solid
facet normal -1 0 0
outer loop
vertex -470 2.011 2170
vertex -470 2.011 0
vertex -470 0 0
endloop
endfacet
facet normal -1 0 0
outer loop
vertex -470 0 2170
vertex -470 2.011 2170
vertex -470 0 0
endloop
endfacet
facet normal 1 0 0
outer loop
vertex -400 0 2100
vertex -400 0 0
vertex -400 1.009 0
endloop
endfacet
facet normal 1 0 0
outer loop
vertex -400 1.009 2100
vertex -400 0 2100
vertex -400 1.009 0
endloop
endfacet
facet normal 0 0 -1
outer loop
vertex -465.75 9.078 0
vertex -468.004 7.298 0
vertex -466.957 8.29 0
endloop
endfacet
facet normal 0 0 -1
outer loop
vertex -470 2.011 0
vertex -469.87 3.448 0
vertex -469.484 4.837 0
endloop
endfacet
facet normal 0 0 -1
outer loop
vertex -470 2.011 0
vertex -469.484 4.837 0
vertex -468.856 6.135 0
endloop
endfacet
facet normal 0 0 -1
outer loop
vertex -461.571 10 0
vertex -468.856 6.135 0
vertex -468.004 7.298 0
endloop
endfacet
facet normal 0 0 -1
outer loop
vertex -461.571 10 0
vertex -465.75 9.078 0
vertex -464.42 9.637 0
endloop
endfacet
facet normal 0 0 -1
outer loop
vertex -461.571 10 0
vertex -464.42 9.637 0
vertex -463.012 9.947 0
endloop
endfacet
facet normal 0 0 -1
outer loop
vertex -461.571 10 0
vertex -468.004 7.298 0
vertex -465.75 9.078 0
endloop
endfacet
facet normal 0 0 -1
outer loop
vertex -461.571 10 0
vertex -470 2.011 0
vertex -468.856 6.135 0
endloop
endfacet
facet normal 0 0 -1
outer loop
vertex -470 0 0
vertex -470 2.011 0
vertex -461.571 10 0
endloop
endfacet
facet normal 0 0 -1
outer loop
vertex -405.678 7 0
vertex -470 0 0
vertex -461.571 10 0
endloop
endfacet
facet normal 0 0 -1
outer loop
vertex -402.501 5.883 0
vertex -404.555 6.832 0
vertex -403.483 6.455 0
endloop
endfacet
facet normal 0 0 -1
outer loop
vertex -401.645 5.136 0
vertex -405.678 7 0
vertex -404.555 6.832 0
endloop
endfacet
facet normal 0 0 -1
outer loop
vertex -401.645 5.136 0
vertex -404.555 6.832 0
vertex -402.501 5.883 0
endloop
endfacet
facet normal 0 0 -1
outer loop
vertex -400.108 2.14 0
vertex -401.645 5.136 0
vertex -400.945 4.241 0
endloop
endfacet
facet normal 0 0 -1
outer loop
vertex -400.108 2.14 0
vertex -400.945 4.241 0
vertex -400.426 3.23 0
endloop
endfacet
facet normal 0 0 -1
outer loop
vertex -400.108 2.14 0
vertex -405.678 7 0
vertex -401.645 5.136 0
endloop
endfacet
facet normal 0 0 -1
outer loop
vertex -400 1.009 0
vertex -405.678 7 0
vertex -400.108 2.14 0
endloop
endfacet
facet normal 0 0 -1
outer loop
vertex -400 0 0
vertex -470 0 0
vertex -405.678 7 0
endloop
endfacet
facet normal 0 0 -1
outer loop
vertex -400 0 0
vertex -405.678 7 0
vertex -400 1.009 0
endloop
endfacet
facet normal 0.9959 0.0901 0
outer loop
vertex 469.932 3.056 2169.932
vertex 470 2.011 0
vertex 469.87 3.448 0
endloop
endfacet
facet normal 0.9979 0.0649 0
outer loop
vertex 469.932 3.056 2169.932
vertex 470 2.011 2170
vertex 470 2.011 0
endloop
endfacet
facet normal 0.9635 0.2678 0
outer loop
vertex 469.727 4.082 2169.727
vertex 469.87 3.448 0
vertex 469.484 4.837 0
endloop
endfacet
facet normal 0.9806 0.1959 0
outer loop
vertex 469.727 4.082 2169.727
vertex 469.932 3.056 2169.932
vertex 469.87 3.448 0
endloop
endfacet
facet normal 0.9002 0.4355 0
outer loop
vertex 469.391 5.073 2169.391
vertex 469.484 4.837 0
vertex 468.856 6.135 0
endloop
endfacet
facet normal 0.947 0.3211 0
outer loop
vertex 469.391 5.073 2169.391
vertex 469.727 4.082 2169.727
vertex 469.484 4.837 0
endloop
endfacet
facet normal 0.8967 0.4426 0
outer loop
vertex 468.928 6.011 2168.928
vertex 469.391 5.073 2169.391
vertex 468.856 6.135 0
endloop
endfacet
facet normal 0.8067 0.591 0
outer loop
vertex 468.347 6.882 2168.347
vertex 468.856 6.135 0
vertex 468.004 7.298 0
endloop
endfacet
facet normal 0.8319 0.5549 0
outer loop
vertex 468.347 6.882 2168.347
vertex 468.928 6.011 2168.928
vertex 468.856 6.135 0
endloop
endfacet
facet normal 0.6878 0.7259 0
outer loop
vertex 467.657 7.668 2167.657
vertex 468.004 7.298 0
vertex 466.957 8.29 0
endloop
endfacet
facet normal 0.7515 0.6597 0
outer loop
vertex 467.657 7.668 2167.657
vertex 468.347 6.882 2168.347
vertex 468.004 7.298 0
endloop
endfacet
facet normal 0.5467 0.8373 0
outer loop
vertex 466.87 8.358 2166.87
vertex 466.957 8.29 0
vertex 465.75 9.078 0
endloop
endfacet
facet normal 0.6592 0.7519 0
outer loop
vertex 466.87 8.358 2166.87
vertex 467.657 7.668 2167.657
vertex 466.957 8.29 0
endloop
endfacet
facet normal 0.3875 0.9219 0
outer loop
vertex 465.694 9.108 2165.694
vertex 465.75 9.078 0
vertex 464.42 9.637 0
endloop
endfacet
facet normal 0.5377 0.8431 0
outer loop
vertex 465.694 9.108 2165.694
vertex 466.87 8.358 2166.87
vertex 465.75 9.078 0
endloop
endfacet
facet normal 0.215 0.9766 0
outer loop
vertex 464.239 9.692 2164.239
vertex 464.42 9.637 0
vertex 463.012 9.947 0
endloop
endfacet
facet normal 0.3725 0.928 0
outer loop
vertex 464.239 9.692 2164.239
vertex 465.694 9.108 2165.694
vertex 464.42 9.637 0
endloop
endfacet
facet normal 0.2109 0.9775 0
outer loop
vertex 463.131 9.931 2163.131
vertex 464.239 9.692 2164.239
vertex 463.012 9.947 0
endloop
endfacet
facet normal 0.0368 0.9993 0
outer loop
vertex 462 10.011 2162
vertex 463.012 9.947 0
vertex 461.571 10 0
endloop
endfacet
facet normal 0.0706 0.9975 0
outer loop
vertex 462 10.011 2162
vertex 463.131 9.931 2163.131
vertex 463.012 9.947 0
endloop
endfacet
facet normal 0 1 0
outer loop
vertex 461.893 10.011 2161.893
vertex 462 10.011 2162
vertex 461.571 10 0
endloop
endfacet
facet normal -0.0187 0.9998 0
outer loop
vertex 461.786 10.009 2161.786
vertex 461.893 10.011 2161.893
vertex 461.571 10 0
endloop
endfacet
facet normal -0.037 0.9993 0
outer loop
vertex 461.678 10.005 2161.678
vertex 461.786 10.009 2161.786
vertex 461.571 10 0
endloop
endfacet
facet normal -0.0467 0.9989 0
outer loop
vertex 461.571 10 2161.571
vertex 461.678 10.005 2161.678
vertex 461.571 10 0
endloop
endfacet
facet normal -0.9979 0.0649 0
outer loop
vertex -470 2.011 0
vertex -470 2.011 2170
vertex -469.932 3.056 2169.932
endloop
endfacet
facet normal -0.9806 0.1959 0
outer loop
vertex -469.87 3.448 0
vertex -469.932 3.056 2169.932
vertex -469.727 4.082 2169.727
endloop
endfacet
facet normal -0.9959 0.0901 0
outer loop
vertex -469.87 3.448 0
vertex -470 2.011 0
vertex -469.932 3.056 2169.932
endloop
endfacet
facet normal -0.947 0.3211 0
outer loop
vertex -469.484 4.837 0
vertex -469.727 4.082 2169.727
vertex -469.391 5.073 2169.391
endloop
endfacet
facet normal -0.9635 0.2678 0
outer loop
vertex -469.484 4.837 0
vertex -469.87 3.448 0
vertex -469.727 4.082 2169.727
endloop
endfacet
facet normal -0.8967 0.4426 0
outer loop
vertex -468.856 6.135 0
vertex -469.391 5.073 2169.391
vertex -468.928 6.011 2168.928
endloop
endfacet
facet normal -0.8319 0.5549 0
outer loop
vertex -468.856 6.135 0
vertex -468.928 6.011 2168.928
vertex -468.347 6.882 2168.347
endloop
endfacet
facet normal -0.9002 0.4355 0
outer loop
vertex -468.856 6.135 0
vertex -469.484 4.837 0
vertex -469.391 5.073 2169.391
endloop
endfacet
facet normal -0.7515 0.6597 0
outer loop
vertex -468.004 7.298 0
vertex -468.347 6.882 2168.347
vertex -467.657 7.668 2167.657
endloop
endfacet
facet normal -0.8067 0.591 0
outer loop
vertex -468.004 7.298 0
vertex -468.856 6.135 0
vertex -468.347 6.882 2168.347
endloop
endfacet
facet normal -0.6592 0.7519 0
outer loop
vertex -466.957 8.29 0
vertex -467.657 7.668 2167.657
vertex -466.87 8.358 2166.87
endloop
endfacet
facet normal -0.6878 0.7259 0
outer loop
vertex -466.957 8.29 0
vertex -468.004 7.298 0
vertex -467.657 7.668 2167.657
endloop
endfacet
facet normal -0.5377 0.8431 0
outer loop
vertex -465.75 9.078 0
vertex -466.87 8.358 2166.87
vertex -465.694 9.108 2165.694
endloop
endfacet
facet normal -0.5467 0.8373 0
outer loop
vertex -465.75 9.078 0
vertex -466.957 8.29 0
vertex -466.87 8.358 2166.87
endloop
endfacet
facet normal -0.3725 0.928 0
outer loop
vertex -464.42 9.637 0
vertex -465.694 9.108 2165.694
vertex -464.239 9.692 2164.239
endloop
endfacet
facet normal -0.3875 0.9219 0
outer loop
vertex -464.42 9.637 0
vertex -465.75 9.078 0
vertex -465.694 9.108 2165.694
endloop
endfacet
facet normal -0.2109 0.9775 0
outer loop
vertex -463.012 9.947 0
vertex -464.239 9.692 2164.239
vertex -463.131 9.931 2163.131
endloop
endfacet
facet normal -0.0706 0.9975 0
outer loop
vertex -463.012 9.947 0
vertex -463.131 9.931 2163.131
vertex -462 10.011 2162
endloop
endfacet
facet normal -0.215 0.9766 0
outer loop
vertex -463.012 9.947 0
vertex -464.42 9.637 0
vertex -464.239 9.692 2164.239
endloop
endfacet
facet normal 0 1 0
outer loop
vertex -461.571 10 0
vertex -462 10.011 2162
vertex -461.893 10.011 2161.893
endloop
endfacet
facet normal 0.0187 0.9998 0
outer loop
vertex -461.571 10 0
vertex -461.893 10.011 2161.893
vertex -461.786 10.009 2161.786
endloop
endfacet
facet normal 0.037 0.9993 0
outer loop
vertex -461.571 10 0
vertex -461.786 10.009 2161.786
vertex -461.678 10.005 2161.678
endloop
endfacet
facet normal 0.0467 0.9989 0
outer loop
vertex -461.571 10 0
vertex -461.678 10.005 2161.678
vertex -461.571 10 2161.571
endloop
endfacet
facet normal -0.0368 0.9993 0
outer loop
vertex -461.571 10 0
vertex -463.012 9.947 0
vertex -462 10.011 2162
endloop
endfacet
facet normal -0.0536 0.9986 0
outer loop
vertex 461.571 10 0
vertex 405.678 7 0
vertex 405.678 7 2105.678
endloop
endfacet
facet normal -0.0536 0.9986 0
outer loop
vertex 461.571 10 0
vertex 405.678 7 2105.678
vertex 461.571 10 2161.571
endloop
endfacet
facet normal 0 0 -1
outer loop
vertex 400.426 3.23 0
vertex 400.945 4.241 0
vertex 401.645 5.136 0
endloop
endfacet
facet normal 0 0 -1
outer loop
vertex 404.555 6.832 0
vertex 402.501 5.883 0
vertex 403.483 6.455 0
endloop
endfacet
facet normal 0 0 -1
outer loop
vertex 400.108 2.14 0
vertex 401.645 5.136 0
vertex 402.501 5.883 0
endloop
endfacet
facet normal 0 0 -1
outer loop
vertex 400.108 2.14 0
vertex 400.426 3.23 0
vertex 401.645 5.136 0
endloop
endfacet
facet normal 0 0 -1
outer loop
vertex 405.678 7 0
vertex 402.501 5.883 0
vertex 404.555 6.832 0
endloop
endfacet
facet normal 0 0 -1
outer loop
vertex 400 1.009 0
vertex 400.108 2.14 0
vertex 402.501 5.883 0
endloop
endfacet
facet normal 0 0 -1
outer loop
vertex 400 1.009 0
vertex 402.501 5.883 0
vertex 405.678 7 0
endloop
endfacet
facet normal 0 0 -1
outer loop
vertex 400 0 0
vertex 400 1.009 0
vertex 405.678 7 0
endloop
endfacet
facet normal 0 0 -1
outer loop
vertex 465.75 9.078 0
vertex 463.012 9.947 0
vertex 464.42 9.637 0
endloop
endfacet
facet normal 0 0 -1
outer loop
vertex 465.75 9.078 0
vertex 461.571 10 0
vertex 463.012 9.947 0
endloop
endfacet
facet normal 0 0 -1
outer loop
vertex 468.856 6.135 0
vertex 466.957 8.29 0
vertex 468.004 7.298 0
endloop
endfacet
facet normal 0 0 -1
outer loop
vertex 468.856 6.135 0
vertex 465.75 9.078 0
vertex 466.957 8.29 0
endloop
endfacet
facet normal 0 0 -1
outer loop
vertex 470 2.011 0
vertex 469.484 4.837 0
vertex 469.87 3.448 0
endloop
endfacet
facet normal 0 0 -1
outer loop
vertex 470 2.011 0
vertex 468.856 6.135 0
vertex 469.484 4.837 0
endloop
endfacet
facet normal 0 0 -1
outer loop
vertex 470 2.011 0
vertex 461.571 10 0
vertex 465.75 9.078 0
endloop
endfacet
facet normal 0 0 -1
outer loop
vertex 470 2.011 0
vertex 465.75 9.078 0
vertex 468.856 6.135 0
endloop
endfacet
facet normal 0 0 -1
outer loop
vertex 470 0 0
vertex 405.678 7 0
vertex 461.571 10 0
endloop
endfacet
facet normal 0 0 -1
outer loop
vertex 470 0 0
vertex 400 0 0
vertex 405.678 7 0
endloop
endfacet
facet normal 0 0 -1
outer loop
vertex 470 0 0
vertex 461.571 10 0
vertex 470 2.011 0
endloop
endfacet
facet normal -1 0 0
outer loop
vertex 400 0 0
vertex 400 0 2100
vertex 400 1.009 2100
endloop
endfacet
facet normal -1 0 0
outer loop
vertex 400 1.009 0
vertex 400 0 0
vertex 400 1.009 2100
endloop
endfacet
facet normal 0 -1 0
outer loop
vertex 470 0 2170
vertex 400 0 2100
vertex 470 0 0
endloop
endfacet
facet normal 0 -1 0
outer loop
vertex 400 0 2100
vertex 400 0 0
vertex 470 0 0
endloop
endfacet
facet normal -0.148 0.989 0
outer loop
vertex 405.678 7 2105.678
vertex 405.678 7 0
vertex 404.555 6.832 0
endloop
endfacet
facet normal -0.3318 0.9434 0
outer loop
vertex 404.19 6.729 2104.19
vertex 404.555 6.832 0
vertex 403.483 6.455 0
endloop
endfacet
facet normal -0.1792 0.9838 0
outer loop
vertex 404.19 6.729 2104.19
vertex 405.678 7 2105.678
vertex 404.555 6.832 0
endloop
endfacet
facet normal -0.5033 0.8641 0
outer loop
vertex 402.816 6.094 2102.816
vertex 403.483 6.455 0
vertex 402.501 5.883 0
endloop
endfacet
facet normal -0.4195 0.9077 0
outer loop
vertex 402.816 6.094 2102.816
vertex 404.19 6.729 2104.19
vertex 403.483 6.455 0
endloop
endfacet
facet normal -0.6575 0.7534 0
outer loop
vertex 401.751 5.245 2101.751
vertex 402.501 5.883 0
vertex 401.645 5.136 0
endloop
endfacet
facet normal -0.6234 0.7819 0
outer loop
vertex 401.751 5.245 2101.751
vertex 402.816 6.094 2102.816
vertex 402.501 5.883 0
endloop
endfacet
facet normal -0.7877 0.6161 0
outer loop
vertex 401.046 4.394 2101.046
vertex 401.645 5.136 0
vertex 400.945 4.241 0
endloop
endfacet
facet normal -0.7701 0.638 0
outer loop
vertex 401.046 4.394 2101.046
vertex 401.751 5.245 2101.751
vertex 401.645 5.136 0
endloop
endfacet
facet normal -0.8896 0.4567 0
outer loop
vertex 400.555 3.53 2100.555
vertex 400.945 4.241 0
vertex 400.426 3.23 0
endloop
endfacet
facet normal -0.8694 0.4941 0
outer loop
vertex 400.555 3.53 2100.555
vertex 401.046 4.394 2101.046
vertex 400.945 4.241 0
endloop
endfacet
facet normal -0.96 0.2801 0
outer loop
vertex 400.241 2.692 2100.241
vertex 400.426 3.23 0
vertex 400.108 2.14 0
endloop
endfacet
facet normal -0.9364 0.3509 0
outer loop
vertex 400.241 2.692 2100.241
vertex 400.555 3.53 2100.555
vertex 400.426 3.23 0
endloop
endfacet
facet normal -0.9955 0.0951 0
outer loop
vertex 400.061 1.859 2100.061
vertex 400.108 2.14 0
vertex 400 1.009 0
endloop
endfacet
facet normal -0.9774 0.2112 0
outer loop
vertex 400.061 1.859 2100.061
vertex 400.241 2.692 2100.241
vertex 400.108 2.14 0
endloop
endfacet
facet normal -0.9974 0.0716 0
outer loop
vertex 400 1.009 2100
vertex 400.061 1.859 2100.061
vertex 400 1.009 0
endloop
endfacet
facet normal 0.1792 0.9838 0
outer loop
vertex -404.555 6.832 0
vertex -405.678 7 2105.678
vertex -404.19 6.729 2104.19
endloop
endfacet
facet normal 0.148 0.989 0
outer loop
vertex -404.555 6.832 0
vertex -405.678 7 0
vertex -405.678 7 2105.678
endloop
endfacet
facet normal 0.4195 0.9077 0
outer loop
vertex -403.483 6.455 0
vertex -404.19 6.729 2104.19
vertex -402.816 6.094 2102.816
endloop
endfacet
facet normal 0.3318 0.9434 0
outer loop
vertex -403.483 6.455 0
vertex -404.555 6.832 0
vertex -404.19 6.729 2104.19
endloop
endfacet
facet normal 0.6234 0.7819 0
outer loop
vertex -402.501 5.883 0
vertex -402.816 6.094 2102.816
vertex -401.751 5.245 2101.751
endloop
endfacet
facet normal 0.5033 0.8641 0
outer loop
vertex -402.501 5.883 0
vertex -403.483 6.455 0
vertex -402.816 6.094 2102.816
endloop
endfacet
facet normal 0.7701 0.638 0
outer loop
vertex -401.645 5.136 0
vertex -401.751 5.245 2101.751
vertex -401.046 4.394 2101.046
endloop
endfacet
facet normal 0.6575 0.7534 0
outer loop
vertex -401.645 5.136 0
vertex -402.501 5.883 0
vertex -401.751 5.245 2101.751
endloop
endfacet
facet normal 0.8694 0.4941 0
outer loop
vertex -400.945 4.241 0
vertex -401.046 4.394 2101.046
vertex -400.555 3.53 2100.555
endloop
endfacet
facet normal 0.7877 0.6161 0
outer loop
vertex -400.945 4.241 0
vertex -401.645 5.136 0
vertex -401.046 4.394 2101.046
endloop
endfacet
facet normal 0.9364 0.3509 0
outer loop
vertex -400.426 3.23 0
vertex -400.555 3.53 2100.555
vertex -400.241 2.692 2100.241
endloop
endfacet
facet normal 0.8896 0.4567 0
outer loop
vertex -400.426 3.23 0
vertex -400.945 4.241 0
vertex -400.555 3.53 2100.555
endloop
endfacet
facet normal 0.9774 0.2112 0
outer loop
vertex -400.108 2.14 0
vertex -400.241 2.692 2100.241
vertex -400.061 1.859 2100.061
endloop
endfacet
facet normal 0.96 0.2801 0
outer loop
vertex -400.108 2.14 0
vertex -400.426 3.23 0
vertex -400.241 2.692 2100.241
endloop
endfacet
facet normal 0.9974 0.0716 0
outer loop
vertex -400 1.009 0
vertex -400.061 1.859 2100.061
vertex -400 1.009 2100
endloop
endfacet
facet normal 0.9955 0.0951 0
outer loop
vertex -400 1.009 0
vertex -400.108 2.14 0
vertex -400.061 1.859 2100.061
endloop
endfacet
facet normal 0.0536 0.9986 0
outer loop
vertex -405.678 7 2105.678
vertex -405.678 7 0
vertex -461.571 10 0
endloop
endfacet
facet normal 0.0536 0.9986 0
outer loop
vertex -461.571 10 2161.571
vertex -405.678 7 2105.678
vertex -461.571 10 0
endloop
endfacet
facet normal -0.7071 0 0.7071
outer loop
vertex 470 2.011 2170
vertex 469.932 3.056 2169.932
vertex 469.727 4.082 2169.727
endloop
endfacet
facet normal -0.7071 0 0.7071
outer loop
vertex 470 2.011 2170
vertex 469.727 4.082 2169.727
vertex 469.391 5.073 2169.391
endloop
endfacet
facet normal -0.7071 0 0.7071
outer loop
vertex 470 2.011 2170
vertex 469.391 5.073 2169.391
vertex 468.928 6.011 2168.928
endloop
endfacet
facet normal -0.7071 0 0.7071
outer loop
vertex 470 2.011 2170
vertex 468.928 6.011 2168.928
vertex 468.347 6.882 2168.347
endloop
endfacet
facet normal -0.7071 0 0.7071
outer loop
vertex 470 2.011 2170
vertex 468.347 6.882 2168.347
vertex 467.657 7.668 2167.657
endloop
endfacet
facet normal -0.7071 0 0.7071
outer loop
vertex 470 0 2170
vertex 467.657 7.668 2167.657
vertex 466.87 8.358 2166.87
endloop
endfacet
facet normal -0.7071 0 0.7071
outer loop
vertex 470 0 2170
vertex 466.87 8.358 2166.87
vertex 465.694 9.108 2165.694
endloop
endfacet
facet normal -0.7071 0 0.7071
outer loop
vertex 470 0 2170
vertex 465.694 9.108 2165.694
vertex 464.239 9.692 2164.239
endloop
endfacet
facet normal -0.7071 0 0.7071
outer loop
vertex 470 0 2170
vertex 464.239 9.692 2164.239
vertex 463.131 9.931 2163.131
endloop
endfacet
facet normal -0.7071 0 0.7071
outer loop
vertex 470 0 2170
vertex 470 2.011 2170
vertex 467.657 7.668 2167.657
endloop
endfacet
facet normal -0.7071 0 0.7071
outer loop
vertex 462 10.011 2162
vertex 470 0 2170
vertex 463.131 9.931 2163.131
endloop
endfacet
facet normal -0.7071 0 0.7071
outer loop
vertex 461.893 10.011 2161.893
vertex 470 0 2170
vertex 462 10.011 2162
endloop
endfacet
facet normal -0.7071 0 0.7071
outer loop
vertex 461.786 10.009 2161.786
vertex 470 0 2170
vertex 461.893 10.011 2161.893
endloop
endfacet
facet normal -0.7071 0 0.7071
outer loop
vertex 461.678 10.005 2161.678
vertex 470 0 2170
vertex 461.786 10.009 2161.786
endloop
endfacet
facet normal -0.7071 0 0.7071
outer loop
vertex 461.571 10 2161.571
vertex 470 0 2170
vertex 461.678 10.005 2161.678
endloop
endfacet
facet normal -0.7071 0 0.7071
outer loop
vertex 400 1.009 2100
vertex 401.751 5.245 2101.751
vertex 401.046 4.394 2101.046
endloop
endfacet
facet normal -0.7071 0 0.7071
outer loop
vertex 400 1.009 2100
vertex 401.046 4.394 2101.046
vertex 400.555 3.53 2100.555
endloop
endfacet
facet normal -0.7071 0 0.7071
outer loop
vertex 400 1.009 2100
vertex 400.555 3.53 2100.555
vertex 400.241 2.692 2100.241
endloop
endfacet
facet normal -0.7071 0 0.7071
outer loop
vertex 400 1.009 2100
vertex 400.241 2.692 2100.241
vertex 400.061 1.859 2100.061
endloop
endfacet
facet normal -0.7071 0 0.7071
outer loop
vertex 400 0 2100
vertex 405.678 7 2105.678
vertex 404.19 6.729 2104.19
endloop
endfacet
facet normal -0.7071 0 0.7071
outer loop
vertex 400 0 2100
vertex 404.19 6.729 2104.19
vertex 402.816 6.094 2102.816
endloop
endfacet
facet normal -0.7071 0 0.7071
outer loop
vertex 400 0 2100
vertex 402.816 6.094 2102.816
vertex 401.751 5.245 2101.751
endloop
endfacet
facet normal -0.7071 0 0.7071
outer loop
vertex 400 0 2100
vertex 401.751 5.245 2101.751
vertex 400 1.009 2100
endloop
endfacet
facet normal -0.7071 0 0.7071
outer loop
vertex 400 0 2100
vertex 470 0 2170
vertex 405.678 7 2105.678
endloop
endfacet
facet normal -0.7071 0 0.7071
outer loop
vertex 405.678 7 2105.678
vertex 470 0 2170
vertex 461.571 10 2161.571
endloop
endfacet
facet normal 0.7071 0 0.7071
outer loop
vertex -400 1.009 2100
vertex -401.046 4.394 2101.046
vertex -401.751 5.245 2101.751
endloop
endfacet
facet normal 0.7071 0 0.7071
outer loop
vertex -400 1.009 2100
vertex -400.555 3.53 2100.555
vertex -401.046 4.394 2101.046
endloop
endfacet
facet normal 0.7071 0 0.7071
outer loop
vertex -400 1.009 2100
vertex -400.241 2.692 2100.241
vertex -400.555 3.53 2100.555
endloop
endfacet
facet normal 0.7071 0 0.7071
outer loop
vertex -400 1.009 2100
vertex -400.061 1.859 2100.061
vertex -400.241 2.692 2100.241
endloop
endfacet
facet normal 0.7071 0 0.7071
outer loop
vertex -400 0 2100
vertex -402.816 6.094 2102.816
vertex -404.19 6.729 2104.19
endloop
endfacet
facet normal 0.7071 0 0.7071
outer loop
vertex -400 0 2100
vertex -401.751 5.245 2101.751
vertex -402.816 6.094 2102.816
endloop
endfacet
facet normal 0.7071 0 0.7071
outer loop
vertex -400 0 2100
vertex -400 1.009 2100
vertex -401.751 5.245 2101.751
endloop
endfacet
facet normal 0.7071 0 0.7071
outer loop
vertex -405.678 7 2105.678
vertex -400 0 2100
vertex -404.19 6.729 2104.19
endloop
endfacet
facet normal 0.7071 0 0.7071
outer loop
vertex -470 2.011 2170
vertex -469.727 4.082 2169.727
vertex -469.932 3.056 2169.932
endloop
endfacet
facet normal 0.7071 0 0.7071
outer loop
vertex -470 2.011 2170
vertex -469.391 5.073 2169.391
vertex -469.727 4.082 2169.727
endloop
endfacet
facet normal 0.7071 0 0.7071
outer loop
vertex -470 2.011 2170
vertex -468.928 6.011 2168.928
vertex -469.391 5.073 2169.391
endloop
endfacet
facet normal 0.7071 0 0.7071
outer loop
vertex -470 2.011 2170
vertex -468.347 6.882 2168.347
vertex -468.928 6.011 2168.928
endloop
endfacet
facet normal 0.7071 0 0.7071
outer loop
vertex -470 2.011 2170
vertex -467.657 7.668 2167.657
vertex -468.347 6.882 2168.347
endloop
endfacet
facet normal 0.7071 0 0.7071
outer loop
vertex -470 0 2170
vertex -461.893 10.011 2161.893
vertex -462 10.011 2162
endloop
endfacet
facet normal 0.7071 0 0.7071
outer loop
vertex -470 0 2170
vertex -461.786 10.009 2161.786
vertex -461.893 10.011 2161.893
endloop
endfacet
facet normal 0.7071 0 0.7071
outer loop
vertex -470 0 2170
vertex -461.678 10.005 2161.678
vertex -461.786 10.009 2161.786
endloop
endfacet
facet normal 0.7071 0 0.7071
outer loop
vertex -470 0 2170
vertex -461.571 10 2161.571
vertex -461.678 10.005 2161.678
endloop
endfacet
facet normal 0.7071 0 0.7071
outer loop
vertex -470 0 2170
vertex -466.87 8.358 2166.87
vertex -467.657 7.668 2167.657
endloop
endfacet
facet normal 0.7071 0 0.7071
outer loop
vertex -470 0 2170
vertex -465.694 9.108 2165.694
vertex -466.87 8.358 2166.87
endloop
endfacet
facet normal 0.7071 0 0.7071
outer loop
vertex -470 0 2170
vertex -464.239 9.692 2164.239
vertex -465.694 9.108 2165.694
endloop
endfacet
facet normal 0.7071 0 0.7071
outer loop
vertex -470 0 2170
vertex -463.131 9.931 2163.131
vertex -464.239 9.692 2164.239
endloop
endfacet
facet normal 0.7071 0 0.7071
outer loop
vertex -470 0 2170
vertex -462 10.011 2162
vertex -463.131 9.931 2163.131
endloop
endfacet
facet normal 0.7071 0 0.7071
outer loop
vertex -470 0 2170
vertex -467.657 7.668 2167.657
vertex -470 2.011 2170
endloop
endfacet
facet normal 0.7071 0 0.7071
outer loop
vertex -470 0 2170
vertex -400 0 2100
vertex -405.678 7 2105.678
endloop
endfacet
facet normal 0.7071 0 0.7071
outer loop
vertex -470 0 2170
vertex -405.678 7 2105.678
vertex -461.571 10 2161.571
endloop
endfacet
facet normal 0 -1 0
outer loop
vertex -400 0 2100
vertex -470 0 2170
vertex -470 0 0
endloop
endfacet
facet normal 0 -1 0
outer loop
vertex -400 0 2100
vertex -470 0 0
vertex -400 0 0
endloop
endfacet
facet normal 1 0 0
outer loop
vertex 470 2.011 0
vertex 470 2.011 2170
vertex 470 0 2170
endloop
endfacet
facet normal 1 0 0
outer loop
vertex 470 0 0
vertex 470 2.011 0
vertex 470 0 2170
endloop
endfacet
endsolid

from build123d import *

# Parameters (mm, degrees)
EXTRUDE039434_DEPTH = 500
SKETCH224_W         = 1600
SKETCH224_H         = 400
EXTRUDE039435_DEPTH = 500


with BuildPart() as extrude039434_internal_superior:
    # Sketch223 (on Sketch) → Extrude039434 (new body, symmetric)
    with BuildSketch(Plane.XZ):
        Polygon((-600, 2300), (600, 2300), (200, 1900), (-200, 1900), align=None)
    extrude(amount=EXTRUDE039434_DEPTH, both=True)


with BuildPart() as extrude039435:
    # Sketch224 (on Sketch) → Extrude039435 (new body, symmetric)
    with BuildSketch(Plane.XZ.offset(140)):
        with Locations((0, -200)):
            Rectangle(SKETCH224_W, SKETCH224_H)
    extrude(amount=EXTRUDE039435_DEPTH, both=True)


with BuildPart() as internal_trim_vertical:
    # Sweep012: sweep along a path in Sketch195
    with BuildLine(Plane.XZ) as sweep012_path:
        Line((-400, 2100), (-400, 0))
        Line((-400, 0), (400, 0))
        Line((400, 0), (400, 2100))
        Line((400, 2100), (-400, 2100))
    # Clone2D028 (on Sketch) → Sweep012 (sweep)
    with BuildSketch(Plane.ZY):
        with BuildLine():
            Line((-61.571224, 10), (-5.678418, 7))
            ThreePointArc((-5.678418, 7), (-1.645147, 5.136003), (0, 1.008624))
            Line((0, 1.008624), (0, 0))
            Line((0, 0), (-70, 0))
            Line((-70, 0), (-70, 2.011499))
            ThreePointArc((-70, 2.011499), (-67.503171, 7.81797), (-61.571224, 10))
        make_face()
    sweep(path=sweep012_path.line, is_frenet=True, transition=Transition.RIGHT)

    # Cut073: cut Extrude039435
    add(extrude039435.part, mode=Mode.SUBTRACT)

    # Cut072: cut Extrude039434_Internal_superior_
    add(extrude039434_internal_superior.part, mode=Mode.SUBTRACT)


solid = internal_trim_vertical.part
